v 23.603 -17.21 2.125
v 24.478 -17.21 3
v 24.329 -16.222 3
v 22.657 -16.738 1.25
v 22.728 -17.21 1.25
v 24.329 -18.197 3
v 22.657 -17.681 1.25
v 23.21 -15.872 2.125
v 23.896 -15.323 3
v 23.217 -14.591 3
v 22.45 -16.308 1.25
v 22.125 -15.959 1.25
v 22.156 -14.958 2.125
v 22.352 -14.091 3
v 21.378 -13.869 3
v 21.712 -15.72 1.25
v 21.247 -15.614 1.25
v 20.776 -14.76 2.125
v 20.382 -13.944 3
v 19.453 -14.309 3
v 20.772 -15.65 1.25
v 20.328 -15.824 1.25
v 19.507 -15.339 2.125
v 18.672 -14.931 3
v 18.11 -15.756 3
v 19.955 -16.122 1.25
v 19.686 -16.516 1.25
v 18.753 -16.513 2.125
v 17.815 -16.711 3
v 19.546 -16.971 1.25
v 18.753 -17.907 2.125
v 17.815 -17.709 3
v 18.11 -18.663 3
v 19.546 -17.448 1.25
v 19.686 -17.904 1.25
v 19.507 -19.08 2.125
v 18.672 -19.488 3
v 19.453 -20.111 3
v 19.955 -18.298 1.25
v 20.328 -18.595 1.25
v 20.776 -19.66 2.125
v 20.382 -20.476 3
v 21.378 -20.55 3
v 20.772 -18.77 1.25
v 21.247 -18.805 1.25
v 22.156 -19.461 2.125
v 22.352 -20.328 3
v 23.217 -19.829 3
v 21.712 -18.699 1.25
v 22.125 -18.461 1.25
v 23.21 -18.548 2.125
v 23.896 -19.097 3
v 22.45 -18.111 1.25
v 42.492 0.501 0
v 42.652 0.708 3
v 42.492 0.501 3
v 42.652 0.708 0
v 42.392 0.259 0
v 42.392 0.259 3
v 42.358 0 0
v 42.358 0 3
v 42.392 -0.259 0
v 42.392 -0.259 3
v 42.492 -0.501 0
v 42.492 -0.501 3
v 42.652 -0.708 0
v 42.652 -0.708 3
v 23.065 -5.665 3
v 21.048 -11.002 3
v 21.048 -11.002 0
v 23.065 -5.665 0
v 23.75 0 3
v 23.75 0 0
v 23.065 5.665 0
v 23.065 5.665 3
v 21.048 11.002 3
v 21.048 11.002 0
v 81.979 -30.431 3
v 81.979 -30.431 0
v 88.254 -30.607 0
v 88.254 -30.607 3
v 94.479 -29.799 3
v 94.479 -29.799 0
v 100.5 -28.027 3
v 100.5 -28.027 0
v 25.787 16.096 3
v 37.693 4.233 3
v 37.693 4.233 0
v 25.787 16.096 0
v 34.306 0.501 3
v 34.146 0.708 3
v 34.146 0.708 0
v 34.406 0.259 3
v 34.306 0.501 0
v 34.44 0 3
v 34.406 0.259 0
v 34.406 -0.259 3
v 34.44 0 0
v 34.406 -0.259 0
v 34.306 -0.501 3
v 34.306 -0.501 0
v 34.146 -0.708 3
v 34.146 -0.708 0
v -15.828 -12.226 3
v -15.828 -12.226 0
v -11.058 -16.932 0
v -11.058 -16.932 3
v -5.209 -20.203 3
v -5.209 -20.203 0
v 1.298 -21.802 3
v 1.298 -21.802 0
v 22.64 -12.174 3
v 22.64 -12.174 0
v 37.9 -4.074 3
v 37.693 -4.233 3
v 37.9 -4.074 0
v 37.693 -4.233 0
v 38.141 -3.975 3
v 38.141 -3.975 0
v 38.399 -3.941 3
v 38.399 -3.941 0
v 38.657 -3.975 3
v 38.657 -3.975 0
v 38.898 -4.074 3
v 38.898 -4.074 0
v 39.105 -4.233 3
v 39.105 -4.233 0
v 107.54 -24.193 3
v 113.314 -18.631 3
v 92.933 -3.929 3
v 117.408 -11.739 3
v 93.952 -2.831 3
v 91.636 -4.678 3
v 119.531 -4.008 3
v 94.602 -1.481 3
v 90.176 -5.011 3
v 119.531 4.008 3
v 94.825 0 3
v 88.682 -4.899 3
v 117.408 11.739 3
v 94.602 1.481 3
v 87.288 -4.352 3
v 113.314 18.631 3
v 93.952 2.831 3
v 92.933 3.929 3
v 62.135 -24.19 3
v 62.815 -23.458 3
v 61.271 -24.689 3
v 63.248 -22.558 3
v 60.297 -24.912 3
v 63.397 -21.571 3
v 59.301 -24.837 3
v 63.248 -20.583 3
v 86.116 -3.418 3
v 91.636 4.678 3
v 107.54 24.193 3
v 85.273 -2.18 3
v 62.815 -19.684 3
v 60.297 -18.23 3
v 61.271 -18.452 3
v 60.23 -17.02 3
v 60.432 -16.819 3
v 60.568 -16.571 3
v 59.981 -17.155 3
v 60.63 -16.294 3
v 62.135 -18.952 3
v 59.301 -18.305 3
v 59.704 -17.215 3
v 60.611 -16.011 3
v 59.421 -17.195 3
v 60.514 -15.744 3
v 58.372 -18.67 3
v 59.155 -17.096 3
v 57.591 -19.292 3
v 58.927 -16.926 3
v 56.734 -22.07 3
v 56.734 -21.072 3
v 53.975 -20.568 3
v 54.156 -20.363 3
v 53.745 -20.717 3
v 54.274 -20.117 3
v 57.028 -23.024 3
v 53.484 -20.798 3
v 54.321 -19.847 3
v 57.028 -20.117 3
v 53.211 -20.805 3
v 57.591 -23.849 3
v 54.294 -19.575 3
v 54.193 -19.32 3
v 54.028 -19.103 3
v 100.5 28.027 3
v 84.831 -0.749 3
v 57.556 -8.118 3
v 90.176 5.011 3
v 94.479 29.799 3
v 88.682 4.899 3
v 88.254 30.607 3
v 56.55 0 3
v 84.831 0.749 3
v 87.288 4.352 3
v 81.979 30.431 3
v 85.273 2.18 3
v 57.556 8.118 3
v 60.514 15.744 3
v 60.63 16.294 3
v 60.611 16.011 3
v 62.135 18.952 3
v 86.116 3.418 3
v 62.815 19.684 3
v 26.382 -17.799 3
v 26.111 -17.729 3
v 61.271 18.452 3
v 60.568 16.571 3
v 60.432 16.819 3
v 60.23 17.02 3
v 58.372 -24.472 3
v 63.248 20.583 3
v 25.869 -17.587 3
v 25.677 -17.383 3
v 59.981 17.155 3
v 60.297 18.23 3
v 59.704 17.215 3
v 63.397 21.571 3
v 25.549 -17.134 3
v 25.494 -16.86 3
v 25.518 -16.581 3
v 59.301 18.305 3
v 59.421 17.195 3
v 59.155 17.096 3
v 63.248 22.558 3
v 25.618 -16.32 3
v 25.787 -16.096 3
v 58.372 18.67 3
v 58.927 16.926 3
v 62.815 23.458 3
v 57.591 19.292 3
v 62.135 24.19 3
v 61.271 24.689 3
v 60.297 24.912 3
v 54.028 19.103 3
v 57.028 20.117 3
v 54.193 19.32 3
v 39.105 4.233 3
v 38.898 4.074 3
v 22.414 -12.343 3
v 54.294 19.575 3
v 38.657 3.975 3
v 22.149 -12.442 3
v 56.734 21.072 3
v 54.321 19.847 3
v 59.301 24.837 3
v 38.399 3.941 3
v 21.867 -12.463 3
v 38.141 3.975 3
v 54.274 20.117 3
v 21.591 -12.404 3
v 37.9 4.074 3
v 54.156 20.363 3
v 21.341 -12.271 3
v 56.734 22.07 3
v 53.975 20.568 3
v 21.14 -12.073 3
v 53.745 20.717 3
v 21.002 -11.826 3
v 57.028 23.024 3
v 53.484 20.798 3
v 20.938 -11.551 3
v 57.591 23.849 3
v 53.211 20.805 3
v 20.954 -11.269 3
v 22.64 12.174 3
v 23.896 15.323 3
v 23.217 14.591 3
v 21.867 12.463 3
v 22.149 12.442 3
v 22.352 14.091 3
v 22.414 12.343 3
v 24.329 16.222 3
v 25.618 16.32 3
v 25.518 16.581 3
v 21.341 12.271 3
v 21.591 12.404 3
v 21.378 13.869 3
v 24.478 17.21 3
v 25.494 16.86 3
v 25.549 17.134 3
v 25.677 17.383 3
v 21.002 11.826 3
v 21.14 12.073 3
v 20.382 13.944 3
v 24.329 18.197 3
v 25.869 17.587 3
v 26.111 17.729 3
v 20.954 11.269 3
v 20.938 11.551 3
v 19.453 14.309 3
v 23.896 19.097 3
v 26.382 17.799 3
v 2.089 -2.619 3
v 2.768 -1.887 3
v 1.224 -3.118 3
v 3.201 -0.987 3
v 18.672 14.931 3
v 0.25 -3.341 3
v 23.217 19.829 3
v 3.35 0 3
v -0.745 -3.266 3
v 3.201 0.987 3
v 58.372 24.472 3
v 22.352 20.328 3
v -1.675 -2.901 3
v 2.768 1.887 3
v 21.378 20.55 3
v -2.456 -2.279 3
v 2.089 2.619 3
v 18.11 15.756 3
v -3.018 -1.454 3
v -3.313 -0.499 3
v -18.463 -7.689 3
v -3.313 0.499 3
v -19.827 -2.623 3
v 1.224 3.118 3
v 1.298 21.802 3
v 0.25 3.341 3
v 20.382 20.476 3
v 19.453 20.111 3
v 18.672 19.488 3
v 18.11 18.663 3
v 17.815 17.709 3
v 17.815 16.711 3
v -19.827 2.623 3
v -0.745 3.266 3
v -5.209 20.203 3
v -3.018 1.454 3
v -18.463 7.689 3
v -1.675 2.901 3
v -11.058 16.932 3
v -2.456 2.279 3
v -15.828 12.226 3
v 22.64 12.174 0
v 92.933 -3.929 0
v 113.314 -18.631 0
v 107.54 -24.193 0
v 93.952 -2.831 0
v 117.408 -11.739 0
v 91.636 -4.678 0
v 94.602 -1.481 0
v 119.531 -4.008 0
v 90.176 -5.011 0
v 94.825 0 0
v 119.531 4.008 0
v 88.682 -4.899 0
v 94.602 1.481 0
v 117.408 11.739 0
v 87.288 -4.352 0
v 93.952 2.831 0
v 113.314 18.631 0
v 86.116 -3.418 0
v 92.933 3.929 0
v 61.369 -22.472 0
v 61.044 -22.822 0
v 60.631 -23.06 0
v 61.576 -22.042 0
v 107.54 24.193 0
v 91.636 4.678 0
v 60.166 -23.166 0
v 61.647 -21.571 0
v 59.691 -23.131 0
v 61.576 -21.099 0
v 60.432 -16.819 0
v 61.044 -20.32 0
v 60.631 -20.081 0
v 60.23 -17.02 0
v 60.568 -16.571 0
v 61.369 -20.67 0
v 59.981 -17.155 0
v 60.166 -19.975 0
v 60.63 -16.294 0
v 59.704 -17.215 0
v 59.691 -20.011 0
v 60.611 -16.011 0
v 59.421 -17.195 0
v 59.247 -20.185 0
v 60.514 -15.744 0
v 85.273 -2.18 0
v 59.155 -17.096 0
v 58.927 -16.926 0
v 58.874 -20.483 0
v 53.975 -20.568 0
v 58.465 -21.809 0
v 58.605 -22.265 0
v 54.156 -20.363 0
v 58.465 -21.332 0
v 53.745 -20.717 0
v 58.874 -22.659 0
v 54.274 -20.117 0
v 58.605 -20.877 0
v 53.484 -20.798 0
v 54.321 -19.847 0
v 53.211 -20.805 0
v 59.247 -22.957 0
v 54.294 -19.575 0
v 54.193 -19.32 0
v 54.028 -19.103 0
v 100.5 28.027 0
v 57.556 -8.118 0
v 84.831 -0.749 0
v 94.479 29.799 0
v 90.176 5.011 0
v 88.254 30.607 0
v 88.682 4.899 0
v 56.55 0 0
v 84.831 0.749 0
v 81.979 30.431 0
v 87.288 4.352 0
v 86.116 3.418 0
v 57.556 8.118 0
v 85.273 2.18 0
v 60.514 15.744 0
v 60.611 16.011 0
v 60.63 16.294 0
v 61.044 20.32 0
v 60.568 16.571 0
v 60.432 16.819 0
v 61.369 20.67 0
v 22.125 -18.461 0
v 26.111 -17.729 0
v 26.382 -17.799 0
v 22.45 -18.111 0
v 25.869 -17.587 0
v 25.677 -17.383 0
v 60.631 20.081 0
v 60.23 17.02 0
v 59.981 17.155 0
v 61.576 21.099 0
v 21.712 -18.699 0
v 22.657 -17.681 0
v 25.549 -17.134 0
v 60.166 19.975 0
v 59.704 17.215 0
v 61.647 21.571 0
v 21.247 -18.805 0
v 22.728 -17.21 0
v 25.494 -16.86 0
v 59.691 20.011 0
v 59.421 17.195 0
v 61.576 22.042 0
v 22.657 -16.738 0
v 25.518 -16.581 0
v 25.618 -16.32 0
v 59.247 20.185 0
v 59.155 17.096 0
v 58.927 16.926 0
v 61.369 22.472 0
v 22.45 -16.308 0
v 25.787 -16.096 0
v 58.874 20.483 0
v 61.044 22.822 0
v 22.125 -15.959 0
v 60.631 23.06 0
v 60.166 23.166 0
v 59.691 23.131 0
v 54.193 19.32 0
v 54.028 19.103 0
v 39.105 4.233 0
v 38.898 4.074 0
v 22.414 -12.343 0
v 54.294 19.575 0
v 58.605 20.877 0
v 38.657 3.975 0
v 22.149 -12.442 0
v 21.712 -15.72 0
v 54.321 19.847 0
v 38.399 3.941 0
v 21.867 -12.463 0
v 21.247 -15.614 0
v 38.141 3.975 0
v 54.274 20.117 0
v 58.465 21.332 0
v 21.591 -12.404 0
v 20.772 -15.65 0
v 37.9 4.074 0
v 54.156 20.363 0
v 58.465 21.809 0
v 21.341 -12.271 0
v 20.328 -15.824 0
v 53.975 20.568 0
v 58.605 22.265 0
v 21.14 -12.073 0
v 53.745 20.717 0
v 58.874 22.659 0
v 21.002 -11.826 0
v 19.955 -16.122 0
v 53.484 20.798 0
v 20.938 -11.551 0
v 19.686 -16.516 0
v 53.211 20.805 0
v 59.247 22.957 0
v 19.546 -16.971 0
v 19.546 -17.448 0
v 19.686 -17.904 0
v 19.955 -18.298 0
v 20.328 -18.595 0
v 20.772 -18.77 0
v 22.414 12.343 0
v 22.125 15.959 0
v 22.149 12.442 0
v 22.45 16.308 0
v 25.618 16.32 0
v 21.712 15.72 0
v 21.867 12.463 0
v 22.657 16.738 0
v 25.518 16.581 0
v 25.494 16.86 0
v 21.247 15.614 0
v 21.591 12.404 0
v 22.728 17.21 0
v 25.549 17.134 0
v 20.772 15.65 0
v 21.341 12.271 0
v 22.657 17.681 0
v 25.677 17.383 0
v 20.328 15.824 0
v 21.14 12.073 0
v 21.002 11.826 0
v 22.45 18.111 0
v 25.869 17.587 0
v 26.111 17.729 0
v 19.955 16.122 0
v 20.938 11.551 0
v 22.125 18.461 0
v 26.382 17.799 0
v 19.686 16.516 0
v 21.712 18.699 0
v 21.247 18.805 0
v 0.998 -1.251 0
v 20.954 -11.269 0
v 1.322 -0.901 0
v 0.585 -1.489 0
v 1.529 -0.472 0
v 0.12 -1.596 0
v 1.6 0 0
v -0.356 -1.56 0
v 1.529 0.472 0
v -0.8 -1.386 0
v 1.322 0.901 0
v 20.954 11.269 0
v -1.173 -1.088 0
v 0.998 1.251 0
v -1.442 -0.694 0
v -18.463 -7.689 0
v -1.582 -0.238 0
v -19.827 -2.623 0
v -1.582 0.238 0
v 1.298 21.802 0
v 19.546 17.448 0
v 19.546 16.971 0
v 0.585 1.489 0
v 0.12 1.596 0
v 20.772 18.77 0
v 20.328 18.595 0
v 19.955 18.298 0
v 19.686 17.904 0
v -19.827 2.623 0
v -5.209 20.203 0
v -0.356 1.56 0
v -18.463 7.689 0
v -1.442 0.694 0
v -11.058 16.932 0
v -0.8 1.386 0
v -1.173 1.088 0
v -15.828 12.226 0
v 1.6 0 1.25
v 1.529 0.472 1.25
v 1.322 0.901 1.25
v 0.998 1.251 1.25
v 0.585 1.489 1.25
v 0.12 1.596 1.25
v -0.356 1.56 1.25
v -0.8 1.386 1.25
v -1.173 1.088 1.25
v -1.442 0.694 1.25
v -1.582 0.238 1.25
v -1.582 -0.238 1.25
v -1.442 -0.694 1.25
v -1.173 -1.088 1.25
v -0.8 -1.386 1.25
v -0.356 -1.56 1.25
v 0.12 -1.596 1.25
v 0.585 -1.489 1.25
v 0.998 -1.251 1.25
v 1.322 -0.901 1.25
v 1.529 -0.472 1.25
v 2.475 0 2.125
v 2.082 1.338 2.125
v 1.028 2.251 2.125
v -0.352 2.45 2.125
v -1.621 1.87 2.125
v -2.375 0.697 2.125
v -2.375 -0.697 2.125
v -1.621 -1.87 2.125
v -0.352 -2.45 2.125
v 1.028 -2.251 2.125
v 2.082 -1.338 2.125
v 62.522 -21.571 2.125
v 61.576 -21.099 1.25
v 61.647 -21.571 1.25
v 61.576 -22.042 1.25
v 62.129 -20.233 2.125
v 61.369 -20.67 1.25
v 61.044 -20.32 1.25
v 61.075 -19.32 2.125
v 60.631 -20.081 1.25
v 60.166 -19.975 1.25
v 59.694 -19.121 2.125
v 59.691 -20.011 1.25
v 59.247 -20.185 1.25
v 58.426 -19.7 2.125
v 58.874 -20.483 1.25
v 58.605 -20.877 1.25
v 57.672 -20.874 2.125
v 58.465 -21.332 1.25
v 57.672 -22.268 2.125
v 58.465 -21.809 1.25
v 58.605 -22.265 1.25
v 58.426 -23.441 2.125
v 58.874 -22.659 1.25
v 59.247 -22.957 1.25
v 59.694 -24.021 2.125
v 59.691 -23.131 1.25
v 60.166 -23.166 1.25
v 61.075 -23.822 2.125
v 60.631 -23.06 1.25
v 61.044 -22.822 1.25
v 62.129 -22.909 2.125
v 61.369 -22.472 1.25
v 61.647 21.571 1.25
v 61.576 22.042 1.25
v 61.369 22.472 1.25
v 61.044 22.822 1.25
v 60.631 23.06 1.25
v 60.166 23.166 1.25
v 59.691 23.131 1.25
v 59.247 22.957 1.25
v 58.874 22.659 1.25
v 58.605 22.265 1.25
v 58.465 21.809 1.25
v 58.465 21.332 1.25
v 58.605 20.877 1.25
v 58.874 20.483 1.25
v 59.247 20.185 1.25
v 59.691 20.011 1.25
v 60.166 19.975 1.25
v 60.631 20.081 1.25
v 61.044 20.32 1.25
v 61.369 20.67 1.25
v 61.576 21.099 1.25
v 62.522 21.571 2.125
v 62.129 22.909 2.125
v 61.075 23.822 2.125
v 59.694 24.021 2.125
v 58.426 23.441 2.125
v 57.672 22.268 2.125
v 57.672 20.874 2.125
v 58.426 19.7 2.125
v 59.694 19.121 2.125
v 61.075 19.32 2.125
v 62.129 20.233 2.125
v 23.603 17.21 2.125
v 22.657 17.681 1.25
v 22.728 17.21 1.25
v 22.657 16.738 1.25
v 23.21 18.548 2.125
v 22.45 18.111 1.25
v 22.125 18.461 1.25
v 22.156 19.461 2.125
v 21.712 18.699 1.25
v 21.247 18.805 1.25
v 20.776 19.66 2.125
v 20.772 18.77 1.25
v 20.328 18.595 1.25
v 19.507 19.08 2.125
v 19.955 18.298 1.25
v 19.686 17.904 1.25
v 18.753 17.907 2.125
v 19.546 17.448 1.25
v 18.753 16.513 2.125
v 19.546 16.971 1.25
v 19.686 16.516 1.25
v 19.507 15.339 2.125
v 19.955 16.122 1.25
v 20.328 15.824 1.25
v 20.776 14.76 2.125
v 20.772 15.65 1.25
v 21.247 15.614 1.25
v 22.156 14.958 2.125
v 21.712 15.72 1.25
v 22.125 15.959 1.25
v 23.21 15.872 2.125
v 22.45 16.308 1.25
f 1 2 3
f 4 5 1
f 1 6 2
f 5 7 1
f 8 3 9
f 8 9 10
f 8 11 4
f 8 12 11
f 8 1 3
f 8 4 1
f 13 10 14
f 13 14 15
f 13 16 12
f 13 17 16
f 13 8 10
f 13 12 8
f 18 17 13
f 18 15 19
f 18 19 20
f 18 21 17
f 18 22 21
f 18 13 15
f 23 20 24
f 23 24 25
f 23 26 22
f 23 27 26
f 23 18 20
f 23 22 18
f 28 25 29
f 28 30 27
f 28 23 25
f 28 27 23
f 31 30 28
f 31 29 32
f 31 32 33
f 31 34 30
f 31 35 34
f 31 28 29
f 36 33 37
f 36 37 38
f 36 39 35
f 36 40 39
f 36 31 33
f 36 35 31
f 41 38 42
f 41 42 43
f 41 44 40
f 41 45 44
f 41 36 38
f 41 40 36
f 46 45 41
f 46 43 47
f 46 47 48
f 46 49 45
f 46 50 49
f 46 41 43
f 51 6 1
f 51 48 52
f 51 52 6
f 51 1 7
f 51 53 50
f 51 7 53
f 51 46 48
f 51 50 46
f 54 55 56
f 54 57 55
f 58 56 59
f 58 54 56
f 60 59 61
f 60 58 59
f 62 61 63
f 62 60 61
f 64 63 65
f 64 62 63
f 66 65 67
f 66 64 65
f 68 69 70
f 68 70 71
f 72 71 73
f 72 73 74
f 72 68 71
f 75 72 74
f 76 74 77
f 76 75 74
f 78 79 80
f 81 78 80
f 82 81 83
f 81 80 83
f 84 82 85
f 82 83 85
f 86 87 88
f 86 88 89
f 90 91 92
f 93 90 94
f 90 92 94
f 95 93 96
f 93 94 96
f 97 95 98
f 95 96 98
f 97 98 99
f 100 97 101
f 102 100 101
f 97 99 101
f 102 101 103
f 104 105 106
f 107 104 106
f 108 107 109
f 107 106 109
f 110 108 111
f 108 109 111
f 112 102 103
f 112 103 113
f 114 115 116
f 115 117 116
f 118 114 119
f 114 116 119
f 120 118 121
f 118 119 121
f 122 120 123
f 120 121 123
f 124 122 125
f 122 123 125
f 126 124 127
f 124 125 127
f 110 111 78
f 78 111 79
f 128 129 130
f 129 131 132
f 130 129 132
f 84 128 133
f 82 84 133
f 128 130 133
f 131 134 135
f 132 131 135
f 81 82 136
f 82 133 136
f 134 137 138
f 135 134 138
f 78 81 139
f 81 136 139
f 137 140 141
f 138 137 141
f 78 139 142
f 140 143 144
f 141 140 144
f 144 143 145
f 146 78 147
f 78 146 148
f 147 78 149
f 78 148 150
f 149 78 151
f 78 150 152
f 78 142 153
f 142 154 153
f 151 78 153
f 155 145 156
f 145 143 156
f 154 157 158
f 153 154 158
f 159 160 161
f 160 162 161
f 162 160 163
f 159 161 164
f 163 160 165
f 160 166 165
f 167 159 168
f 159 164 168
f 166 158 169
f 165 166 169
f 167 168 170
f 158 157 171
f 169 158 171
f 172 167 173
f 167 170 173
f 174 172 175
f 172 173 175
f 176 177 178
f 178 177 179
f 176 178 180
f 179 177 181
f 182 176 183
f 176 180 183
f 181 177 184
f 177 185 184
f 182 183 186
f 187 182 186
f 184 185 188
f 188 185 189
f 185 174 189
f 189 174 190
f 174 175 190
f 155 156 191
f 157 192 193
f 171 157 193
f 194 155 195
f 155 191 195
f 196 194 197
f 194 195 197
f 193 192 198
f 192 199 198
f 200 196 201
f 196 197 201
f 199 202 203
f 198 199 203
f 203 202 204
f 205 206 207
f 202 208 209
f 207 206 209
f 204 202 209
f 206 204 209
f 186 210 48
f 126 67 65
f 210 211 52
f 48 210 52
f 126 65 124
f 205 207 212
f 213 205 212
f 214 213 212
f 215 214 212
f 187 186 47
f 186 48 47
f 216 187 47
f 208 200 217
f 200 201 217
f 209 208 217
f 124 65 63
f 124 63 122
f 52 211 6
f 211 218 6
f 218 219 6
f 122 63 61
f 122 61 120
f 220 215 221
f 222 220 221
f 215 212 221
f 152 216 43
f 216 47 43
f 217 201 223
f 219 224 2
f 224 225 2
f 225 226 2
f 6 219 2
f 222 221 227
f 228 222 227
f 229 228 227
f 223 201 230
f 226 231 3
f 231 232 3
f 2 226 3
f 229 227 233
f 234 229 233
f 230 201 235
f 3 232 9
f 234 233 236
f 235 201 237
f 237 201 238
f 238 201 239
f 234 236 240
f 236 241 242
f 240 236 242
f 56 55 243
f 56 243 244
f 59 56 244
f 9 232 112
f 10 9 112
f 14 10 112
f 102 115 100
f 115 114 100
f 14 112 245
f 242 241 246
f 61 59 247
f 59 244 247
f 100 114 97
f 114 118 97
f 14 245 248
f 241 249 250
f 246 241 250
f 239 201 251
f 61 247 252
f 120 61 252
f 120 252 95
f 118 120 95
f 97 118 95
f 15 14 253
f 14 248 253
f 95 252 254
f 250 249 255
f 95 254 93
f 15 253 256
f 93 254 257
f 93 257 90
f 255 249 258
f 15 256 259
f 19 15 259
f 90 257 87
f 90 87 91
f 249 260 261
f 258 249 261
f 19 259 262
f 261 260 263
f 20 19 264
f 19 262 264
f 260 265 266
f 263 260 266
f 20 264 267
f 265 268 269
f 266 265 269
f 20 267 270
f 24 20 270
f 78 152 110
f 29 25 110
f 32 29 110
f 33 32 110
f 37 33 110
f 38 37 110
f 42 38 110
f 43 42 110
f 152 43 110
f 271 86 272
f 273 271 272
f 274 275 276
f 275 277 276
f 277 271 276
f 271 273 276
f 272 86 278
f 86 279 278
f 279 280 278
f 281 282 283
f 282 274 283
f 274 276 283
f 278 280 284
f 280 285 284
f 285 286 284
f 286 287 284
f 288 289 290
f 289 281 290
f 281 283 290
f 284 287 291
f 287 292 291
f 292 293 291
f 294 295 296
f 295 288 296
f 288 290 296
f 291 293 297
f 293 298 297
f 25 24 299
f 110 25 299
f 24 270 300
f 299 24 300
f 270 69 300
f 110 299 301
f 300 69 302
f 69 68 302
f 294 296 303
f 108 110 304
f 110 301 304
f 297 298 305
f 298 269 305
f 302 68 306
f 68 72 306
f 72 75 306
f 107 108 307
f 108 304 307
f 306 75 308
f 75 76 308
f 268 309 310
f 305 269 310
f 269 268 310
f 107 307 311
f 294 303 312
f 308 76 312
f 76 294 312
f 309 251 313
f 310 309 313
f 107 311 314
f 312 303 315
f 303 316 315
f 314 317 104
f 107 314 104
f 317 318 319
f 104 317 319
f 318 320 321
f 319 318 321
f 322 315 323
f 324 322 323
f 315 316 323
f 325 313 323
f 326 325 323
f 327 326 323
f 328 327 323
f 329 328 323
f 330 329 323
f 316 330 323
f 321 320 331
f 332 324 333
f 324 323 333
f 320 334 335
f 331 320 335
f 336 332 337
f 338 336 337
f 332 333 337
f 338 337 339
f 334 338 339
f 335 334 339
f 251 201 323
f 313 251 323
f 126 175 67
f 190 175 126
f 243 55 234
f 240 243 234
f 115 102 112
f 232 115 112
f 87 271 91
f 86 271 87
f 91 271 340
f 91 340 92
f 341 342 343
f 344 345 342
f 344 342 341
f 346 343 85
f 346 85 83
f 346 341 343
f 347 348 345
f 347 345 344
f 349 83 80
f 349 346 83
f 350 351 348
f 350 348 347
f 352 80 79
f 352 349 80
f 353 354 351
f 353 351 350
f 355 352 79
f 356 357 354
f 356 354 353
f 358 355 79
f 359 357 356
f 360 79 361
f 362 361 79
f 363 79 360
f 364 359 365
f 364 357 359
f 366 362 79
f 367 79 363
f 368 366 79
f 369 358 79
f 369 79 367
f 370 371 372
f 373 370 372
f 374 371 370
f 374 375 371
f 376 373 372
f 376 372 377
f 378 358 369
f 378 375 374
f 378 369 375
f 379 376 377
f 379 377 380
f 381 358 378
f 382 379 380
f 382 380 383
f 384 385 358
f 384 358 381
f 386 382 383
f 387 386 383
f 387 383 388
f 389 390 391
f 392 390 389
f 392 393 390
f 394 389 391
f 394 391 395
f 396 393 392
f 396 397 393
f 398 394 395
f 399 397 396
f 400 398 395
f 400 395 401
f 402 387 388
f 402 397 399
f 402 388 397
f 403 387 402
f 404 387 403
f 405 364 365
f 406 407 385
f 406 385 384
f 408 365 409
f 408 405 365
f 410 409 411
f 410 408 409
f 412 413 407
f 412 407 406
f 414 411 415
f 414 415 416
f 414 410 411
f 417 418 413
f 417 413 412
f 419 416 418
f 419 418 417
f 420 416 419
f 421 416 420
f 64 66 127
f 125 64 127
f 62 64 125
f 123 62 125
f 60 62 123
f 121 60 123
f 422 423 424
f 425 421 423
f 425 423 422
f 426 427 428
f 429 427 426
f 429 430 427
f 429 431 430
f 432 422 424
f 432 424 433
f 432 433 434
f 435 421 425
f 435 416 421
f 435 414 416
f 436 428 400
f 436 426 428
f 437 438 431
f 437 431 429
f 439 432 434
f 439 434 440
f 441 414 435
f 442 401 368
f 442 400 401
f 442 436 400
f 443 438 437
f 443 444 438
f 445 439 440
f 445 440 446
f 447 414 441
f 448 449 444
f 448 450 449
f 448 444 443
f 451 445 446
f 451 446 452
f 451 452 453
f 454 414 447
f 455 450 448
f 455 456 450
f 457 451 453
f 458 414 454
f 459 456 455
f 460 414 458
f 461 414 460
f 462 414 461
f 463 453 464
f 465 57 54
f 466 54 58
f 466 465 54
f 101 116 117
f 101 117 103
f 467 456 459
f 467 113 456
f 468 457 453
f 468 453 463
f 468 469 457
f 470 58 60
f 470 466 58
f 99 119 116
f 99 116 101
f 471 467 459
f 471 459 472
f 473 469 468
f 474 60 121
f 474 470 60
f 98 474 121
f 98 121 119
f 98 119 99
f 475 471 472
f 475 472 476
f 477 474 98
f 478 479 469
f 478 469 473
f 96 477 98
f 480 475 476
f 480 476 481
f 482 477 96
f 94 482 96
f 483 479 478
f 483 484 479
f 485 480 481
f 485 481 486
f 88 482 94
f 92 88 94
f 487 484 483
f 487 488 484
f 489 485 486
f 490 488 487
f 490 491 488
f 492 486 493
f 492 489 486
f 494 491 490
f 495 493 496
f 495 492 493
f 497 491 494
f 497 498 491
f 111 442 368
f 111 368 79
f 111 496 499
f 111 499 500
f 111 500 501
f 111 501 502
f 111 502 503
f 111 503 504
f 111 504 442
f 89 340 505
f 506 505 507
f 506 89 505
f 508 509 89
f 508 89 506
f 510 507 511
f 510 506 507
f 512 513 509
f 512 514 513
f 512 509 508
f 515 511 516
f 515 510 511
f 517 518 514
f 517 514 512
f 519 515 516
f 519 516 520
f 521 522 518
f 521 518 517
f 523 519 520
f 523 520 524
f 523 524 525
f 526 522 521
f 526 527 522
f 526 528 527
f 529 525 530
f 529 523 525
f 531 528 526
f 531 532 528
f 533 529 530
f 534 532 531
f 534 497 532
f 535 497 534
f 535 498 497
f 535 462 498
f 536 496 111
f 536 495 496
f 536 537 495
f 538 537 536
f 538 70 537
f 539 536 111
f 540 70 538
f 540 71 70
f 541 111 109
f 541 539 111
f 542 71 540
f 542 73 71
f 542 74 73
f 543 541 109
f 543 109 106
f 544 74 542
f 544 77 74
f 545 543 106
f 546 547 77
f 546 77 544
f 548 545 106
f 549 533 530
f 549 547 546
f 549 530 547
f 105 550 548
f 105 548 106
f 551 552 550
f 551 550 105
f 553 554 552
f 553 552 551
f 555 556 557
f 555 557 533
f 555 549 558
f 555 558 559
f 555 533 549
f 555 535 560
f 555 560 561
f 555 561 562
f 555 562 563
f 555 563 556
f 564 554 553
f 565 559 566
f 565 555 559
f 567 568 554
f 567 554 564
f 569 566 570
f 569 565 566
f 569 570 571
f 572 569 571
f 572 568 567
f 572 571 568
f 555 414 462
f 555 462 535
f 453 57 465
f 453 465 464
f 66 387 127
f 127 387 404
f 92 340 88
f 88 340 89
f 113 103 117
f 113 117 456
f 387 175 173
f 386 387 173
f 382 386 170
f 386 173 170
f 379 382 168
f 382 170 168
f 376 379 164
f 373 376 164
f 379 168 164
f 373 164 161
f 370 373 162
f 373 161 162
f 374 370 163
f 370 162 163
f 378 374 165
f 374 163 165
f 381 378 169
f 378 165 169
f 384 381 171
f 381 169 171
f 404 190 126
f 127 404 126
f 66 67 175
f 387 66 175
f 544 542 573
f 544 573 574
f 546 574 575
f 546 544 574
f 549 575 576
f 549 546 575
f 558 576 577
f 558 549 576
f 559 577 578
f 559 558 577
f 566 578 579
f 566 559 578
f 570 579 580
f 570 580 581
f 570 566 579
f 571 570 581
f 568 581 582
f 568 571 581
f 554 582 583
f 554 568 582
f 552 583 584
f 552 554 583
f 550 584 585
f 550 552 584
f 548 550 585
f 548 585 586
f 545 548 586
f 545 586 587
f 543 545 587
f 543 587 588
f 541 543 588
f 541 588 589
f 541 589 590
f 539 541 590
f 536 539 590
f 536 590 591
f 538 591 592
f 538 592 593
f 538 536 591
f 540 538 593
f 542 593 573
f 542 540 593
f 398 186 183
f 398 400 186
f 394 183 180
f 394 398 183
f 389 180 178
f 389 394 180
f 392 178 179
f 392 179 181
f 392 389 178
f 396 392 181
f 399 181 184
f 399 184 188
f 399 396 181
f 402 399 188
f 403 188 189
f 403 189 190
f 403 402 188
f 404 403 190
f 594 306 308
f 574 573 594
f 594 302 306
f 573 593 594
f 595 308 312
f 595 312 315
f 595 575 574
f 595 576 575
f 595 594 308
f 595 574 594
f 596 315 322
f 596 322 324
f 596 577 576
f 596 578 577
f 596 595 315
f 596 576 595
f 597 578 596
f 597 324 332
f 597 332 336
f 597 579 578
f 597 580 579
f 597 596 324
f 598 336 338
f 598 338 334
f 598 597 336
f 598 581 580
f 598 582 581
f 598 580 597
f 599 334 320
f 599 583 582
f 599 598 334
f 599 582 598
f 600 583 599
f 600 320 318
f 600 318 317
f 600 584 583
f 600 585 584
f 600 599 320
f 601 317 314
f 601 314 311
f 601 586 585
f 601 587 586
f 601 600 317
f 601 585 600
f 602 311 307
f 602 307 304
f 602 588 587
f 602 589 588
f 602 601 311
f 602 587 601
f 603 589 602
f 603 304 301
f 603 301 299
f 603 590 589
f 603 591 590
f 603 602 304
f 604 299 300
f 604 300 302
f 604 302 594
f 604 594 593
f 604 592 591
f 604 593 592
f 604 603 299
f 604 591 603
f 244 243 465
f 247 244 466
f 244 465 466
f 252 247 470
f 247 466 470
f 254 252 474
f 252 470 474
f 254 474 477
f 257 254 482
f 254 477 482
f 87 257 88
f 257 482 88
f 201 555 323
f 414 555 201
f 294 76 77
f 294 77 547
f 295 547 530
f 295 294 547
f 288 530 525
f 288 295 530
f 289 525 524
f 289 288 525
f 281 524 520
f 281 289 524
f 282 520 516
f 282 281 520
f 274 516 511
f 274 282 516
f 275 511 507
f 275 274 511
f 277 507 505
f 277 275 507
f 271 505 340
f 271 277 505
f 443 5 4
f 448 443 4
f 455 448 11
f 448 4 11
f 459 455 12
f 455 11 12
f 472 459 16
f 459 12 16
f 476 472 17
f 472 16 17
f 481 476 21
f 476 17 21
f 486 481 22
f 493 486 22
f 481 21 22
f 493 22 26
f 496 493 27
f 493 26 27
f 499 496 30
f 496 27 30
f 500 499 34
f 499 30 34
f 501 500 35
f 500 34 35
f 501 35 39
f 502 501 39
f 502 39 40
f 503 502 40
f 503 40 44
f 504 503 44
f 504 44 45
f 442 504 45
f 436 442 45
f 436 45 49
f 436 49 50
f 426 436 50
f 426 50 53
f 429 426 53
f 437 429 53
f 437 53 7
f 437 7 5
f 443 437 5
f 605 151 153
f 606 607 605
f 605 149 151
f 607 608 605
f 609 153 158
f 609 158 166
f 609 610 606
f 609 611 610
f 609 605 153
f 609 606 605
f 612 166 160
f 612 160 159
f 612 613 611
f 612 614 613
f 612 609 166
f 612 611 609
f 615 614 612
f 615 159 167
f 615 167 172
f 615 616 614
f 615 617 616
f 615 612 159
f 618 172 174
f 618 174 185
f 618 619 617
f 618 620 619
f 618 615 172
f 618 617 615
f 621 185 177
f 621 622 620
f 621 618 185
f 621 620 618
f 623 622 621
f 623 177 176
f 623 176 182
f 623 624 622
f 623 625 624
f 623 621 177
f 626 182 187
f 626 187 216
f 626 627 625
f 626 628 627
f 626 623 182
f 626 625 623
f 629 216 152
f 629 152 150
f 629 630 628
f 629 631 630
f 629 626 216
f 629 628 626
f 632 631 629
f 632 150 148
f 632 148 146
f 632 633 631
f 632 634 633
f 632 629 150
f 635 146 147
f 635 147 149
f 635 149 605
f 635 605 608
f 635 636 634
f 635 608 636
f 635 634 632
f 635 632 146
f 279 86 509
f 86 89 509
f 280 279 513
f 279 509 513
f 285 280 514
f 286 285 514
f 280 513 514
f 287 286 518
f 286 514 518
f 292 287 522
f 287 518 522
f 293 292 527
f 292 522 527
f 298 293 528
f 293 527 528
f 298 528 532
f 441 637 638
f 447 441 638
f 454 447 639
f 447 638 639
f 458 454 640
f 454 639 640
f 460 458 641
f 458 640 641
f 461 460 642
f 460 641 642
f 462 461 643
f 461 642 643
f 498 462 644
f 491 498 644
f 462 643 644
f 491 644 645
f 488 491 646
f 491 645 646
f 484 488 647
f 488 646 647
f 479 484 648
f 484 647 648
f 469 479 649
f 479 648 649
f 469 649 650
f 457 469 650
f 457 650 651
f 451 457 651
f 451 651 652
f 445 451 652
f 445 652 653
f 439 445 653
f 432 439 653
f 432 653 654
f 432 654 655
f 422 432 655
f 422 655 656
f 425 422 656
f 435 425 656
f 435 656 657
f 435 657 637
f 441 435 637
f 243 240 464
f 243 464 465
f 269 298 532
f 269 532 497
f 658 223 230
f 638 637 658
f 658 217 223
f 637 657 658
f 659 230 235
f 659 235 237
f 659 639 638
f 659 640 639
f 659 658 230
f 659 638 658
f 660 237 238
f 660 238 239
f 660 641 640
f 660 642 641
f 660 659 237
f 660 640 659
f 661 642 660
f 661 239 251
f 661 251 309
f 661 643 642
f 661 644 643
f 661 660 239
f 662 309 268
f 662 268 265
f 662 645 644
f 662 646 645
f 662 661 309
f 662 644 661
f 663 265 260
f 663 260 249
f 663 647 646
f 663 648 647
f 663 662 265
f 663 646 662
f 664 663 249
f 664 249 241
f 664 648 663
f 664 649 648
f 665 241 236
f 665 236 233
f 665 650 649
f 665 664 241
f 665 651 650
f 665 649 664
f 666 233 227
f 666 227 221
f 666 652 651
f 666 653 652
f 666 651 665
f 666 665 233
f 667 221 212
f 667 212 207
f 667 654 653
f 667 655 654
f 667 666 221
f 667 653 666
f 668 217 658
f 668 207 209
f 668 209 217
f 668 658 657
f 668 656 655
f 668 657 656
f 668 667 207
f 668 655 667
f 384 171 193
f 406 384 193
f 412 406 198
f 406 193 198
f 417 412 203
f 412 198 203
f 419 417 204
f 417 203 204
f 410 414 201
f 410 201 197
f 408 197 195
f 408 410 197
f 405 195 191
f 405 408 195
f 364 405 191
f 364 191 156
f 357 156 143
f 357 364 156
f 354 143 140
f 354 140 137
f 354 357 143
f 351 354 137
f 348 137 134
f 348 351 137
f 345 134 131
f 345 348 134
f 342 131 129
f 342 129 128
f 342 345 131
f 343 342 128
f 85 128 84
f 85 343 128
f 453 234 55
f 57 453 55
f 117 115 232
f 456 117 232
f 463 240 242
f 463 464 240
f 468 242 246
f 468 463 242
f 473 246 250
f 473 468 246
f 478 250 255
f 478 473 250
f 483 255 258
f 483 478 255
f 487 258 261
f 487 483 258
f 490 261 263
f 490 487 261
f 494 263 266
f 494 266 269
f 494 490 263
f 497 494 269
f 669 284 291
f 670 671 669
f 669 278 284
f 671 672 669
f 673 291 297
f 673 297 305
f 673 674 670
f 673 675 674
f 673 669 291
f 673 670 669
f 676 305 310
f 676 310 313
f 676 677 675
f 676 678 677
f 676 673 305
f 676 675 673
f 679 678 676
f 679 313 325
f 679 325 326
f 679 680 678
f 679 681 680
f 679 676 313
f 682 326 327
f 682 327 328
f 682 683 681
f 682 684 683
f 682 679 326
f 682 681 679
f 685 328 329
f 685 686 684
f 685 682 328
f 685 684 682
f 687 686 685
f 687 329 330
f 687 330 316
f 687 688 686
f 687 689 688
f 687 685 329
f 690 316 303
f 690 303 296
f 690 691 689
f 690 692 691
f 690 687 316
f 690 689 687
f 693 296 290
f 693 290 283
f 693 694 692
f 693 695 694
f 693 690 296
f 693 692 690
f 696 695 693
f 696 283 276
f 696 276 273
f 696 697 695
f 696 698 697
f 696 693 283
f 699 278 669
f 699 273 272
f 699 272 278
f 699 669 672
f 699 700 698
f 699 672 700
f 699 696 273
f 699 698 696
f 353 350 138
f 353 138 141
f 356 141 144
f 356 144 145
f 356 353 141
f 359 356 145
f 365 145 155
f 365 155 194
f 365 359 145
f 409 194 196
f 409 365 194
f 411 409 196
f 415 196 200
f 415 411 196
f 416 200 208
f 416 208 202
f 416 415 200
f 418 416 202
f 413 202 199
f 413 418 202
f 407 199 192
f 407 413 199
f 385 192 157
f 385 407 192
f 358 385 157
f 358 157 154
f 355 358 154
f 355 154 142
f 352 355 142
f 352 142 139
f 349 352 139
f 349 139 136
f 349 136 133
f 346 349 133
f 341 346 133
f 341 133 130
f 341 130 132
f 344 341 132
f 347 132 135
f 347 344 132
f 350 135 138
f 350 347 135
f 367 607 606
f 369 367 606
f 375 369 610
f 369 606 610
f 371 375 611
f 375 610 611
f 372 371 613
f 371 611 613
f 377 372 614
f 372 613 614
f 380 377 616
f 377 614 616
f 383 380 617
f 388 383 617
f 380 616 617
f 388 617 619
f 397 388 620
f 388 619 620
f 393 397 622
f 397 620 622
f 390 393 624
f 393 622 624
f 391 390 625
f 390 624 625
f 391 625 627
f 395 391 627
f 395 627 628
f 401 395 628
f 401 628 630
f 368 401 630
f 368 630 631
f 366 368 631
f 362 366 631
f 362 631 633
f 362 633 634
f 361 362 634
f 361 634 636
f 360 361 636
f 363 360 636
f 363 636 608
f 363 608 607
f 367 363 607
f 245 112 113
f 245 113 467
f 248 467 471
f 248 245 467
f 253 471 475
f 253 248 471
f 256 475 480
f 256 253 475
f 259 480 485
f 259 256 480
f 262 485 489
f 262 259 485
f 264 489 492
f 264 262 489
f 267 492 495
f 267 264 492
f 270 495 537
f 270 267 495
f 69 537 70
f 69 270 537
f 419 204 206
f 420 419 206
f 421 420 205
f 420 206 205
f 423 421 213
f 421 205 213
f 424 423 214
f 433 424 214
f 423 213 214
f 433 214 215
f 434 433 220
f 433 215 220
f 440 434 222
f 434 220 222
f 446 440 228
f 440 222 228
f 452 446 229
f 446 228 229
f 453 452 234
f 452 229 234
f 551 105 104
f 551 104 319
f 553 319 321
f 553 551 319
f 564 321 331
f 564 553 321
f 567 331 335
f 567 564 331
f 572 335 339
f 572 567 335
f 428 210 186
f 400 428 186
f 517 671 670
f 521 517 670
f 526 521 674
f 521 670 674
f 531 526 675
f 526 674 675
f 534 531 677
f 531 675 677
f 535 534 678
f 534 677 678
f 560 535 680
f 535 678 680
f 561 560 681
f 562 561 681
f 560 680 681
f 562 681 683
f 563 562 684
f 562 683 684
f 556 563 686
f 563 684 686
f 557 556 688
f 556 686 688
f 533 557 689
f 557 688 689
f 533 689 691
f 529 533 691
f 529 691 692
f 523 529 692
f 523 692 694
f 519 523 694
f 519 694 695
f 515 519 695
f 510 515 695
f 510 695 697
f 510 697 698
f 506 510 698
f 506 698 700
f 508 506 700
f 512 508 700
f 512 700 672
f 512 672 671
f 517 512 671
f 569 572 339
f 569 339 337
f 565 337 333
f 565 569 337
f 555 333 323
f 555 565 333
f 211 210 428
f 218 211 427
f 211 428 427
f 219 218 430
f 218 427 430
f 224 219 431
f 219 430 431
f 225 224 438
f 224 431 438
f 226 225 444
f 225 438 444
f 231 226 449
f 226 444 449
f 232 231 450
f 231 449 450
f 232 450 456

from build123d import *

# Parameters (mm, degrees)
SKETCH_1_R          = 1.6
SKETCH_1_R_2        = 5.025
EXTRUDE_1_DEPTH     = 3
SKETCH_2_R          = 1.6
CUT_EXTRUDE_1_DEPTH = 124.535581919
FILLET_1_R          = 1
EXTRUDE_START       = -3
EXTRUDE_2_DEPTH     = 3
CHAMFER_1_SIZE      = 1.75


with BuildPart() as part:
    # ｽｹｯﾁ1 → ﾎﾞｽ - 押し出し1 (new body)
    with BuildSketch(Plane.XY):
        with BuildLine():
            Line((-2.227171492, 19.875605831), (86.459242762, 29.813408746))
            ThreePointArc((86.459242762, 29.813408746), (119.8, 0), (86.459242762, -29.813408746))
            Line((86.459242762, -29.813408746), (-2.227171492, -19.875605831))
            ThreePointArc((-2.227171492, -19.875605831), (-20, 0), (-2.227171492, 19.875605831))
        make_face()
        Circle(SKETCH_1_R, mode=Mode.SUBTRACT)
        with Locations((89.8, 0)):
            Circle(SKETCH_1_R_2, mode=Mode.SUBTRACT)
    extrude(amount=EXTRUDE_1_DEPTH)

    # ｽｹｯﾁ2 → ｶｯﾄ - 押し出し1 (cut, through all)
    with BuildSketch(Plane.XY.offset(3)):
        with Locations((21.127828075, 17.209804787)):
            Circle(SKETCH_2_R)
        with Locations((21.127828075, -17.209804787)):
            Circle(SKETCH_2_R)
        with Locations((60.046685431, -21.570877871)):
            Circle(SKETCH_2_R)
        with Locations((60.046685431, 21.570877871)):
            Circle(SKETCH_2_R)
        Polygon((24.311632117, -17.566567628), (56.056085363, -21.123709076), (38.398951009, -3.529263334), align=None)
        Polygon((24.311632117, 17.566567628), (56.056085363, 21.123709076), (38.398951009, 3.529263334), align=None)
        with BuildLine():
            Line((34.857112989, 0), (22.640031329, -12.173707016))
            ThreePointArc((22.640031329, -12.173707016), (21.34147622, -12.270762122), (21.047953505, -11.002097675))
            ThreePointArc((21.047953505, -11.002097675), (23.75, 0), (21.047953505, 11.002097675))
            ThreePointArc((21.047953505, 11.002097675), (21.34147622, 12.270762122), (22.640031329, 12.173707016))
            Line((22.640031329, 12.173707016), (34.857112989, 0))
        make_face()
        with BuildLine():
            Line((58.927113914, 16.926017866), (41.940789029, 0))
            Line((41.940789029, 0), (58.927113914, -16.926017866))
            ThreePointArc((58.927113914, -16.926017866), (60.230336409, -17.019617306), (60.513751544, -15.744146574))
            ThreePointArc((60.513751544, -15.744146574), (56.55, 0), (60.513751544, 15.744146574))
            ThreePointArc((60.513751544, 15.744146574), (60.230336409, 17.019617306), (58.927113914, 16.926017866))
        make_face()
    extrude(amount=-CUT_EXTRUDE_1_DEPTH, mode=Mode.SUBTRACT)

    # ﾌｨﾚｯﾄ1
    fillet_1_edges = [part.edges().sort_by_distance(p)[0] for p in [
        (41.940789029, 0, 1.5),
        (56.056085363, 21.123709076, 1.5),
        (38.398951009, 3.529263334, 1.5),
        (24.311632117, 17.566567628, 1.5),
        (34.857112989, 0, 1.5),
        (38.398951009, -3.529263334, 1.5),
        (56.056085363, -21.123709076, 1.5),
        (24.311632117, -17.566567628, 1.5),
    ]]
    fillet(fillet_1_edges, radius=FILLET_1_R)

    # ｽｹｯﾁ3 → ﾎﾞｽ - 押し出し2 (add)
    with BuildSketch(Plane.XY.offset(3).offset(EXTRUDE_START)):
        with BuildLine():
            Line((1.298294376, 21.801707083), (81.979371475, 30.430868694))
            ThreePointArc((81.979371475, 30.430868694), (91.382052123, 30.32494875), (100.500192923, 28.026877661))
            ThreePointArc((100.500192923, 28.026877661), (93.586587742, 29.760069779), (86.459242762, 29.813408746))
            Line((86.459242762, 29.813408746), (-2.227171492, 19.875605831))
            ThreePointArc((-2.227171492, 19.875605831), (-9.804357498, 17.431998567), (-15.827921381, 12.226074789))
            ThreePointArc((-15.827921381, 12.226074789), (-8.243504916, 18.764300705), (1.298294376, 21.801707083))
        make_face()
        with BuildLine():
            Line((1.298294376, -21.801707083), (81.979371475, -30.430868694))
            ThreePointArc((81.979371475, -30.430868694), (91.382052123, -30.32494875), (100.500192923, -28.026877661))
            ThreePointArc((100.500192923, -28.026877661), (93.586587742, -29.760069779), (86.459242762, -29.813408746))
            Line((86.459242762, -29.813408746), (-2.227171492, -19.875605831))
            ThreePointArc((-2.227171492, -19.875605831), (-9.804357498, -17.431998567), (-15.827921381, -12.226074789))
            ThreePointArc((-15.827921381, -12.226074789), (-8.243504916, -18.764300705), (1.298294376, -21.801707083))
        make_face()
    extrude(amount=EXTRUDE_2_DEPTH)

    # 面取り1
    chamfer_1_edges = [part.edges().sort_by_distance(p)[0] for p in [
        (-1.6, 0, 3),
        (19.527828075, 17.209804787, 3),
        (58.446685431, 21.570877871, 3),
        (58.446685431, -21.570877871, 3),
        (19.527828075, -17.209804787, 3),
    ]]
    chamfer(chamfer_1_edges, length=CHAMFER_1_SIZE)


solid = part.part
